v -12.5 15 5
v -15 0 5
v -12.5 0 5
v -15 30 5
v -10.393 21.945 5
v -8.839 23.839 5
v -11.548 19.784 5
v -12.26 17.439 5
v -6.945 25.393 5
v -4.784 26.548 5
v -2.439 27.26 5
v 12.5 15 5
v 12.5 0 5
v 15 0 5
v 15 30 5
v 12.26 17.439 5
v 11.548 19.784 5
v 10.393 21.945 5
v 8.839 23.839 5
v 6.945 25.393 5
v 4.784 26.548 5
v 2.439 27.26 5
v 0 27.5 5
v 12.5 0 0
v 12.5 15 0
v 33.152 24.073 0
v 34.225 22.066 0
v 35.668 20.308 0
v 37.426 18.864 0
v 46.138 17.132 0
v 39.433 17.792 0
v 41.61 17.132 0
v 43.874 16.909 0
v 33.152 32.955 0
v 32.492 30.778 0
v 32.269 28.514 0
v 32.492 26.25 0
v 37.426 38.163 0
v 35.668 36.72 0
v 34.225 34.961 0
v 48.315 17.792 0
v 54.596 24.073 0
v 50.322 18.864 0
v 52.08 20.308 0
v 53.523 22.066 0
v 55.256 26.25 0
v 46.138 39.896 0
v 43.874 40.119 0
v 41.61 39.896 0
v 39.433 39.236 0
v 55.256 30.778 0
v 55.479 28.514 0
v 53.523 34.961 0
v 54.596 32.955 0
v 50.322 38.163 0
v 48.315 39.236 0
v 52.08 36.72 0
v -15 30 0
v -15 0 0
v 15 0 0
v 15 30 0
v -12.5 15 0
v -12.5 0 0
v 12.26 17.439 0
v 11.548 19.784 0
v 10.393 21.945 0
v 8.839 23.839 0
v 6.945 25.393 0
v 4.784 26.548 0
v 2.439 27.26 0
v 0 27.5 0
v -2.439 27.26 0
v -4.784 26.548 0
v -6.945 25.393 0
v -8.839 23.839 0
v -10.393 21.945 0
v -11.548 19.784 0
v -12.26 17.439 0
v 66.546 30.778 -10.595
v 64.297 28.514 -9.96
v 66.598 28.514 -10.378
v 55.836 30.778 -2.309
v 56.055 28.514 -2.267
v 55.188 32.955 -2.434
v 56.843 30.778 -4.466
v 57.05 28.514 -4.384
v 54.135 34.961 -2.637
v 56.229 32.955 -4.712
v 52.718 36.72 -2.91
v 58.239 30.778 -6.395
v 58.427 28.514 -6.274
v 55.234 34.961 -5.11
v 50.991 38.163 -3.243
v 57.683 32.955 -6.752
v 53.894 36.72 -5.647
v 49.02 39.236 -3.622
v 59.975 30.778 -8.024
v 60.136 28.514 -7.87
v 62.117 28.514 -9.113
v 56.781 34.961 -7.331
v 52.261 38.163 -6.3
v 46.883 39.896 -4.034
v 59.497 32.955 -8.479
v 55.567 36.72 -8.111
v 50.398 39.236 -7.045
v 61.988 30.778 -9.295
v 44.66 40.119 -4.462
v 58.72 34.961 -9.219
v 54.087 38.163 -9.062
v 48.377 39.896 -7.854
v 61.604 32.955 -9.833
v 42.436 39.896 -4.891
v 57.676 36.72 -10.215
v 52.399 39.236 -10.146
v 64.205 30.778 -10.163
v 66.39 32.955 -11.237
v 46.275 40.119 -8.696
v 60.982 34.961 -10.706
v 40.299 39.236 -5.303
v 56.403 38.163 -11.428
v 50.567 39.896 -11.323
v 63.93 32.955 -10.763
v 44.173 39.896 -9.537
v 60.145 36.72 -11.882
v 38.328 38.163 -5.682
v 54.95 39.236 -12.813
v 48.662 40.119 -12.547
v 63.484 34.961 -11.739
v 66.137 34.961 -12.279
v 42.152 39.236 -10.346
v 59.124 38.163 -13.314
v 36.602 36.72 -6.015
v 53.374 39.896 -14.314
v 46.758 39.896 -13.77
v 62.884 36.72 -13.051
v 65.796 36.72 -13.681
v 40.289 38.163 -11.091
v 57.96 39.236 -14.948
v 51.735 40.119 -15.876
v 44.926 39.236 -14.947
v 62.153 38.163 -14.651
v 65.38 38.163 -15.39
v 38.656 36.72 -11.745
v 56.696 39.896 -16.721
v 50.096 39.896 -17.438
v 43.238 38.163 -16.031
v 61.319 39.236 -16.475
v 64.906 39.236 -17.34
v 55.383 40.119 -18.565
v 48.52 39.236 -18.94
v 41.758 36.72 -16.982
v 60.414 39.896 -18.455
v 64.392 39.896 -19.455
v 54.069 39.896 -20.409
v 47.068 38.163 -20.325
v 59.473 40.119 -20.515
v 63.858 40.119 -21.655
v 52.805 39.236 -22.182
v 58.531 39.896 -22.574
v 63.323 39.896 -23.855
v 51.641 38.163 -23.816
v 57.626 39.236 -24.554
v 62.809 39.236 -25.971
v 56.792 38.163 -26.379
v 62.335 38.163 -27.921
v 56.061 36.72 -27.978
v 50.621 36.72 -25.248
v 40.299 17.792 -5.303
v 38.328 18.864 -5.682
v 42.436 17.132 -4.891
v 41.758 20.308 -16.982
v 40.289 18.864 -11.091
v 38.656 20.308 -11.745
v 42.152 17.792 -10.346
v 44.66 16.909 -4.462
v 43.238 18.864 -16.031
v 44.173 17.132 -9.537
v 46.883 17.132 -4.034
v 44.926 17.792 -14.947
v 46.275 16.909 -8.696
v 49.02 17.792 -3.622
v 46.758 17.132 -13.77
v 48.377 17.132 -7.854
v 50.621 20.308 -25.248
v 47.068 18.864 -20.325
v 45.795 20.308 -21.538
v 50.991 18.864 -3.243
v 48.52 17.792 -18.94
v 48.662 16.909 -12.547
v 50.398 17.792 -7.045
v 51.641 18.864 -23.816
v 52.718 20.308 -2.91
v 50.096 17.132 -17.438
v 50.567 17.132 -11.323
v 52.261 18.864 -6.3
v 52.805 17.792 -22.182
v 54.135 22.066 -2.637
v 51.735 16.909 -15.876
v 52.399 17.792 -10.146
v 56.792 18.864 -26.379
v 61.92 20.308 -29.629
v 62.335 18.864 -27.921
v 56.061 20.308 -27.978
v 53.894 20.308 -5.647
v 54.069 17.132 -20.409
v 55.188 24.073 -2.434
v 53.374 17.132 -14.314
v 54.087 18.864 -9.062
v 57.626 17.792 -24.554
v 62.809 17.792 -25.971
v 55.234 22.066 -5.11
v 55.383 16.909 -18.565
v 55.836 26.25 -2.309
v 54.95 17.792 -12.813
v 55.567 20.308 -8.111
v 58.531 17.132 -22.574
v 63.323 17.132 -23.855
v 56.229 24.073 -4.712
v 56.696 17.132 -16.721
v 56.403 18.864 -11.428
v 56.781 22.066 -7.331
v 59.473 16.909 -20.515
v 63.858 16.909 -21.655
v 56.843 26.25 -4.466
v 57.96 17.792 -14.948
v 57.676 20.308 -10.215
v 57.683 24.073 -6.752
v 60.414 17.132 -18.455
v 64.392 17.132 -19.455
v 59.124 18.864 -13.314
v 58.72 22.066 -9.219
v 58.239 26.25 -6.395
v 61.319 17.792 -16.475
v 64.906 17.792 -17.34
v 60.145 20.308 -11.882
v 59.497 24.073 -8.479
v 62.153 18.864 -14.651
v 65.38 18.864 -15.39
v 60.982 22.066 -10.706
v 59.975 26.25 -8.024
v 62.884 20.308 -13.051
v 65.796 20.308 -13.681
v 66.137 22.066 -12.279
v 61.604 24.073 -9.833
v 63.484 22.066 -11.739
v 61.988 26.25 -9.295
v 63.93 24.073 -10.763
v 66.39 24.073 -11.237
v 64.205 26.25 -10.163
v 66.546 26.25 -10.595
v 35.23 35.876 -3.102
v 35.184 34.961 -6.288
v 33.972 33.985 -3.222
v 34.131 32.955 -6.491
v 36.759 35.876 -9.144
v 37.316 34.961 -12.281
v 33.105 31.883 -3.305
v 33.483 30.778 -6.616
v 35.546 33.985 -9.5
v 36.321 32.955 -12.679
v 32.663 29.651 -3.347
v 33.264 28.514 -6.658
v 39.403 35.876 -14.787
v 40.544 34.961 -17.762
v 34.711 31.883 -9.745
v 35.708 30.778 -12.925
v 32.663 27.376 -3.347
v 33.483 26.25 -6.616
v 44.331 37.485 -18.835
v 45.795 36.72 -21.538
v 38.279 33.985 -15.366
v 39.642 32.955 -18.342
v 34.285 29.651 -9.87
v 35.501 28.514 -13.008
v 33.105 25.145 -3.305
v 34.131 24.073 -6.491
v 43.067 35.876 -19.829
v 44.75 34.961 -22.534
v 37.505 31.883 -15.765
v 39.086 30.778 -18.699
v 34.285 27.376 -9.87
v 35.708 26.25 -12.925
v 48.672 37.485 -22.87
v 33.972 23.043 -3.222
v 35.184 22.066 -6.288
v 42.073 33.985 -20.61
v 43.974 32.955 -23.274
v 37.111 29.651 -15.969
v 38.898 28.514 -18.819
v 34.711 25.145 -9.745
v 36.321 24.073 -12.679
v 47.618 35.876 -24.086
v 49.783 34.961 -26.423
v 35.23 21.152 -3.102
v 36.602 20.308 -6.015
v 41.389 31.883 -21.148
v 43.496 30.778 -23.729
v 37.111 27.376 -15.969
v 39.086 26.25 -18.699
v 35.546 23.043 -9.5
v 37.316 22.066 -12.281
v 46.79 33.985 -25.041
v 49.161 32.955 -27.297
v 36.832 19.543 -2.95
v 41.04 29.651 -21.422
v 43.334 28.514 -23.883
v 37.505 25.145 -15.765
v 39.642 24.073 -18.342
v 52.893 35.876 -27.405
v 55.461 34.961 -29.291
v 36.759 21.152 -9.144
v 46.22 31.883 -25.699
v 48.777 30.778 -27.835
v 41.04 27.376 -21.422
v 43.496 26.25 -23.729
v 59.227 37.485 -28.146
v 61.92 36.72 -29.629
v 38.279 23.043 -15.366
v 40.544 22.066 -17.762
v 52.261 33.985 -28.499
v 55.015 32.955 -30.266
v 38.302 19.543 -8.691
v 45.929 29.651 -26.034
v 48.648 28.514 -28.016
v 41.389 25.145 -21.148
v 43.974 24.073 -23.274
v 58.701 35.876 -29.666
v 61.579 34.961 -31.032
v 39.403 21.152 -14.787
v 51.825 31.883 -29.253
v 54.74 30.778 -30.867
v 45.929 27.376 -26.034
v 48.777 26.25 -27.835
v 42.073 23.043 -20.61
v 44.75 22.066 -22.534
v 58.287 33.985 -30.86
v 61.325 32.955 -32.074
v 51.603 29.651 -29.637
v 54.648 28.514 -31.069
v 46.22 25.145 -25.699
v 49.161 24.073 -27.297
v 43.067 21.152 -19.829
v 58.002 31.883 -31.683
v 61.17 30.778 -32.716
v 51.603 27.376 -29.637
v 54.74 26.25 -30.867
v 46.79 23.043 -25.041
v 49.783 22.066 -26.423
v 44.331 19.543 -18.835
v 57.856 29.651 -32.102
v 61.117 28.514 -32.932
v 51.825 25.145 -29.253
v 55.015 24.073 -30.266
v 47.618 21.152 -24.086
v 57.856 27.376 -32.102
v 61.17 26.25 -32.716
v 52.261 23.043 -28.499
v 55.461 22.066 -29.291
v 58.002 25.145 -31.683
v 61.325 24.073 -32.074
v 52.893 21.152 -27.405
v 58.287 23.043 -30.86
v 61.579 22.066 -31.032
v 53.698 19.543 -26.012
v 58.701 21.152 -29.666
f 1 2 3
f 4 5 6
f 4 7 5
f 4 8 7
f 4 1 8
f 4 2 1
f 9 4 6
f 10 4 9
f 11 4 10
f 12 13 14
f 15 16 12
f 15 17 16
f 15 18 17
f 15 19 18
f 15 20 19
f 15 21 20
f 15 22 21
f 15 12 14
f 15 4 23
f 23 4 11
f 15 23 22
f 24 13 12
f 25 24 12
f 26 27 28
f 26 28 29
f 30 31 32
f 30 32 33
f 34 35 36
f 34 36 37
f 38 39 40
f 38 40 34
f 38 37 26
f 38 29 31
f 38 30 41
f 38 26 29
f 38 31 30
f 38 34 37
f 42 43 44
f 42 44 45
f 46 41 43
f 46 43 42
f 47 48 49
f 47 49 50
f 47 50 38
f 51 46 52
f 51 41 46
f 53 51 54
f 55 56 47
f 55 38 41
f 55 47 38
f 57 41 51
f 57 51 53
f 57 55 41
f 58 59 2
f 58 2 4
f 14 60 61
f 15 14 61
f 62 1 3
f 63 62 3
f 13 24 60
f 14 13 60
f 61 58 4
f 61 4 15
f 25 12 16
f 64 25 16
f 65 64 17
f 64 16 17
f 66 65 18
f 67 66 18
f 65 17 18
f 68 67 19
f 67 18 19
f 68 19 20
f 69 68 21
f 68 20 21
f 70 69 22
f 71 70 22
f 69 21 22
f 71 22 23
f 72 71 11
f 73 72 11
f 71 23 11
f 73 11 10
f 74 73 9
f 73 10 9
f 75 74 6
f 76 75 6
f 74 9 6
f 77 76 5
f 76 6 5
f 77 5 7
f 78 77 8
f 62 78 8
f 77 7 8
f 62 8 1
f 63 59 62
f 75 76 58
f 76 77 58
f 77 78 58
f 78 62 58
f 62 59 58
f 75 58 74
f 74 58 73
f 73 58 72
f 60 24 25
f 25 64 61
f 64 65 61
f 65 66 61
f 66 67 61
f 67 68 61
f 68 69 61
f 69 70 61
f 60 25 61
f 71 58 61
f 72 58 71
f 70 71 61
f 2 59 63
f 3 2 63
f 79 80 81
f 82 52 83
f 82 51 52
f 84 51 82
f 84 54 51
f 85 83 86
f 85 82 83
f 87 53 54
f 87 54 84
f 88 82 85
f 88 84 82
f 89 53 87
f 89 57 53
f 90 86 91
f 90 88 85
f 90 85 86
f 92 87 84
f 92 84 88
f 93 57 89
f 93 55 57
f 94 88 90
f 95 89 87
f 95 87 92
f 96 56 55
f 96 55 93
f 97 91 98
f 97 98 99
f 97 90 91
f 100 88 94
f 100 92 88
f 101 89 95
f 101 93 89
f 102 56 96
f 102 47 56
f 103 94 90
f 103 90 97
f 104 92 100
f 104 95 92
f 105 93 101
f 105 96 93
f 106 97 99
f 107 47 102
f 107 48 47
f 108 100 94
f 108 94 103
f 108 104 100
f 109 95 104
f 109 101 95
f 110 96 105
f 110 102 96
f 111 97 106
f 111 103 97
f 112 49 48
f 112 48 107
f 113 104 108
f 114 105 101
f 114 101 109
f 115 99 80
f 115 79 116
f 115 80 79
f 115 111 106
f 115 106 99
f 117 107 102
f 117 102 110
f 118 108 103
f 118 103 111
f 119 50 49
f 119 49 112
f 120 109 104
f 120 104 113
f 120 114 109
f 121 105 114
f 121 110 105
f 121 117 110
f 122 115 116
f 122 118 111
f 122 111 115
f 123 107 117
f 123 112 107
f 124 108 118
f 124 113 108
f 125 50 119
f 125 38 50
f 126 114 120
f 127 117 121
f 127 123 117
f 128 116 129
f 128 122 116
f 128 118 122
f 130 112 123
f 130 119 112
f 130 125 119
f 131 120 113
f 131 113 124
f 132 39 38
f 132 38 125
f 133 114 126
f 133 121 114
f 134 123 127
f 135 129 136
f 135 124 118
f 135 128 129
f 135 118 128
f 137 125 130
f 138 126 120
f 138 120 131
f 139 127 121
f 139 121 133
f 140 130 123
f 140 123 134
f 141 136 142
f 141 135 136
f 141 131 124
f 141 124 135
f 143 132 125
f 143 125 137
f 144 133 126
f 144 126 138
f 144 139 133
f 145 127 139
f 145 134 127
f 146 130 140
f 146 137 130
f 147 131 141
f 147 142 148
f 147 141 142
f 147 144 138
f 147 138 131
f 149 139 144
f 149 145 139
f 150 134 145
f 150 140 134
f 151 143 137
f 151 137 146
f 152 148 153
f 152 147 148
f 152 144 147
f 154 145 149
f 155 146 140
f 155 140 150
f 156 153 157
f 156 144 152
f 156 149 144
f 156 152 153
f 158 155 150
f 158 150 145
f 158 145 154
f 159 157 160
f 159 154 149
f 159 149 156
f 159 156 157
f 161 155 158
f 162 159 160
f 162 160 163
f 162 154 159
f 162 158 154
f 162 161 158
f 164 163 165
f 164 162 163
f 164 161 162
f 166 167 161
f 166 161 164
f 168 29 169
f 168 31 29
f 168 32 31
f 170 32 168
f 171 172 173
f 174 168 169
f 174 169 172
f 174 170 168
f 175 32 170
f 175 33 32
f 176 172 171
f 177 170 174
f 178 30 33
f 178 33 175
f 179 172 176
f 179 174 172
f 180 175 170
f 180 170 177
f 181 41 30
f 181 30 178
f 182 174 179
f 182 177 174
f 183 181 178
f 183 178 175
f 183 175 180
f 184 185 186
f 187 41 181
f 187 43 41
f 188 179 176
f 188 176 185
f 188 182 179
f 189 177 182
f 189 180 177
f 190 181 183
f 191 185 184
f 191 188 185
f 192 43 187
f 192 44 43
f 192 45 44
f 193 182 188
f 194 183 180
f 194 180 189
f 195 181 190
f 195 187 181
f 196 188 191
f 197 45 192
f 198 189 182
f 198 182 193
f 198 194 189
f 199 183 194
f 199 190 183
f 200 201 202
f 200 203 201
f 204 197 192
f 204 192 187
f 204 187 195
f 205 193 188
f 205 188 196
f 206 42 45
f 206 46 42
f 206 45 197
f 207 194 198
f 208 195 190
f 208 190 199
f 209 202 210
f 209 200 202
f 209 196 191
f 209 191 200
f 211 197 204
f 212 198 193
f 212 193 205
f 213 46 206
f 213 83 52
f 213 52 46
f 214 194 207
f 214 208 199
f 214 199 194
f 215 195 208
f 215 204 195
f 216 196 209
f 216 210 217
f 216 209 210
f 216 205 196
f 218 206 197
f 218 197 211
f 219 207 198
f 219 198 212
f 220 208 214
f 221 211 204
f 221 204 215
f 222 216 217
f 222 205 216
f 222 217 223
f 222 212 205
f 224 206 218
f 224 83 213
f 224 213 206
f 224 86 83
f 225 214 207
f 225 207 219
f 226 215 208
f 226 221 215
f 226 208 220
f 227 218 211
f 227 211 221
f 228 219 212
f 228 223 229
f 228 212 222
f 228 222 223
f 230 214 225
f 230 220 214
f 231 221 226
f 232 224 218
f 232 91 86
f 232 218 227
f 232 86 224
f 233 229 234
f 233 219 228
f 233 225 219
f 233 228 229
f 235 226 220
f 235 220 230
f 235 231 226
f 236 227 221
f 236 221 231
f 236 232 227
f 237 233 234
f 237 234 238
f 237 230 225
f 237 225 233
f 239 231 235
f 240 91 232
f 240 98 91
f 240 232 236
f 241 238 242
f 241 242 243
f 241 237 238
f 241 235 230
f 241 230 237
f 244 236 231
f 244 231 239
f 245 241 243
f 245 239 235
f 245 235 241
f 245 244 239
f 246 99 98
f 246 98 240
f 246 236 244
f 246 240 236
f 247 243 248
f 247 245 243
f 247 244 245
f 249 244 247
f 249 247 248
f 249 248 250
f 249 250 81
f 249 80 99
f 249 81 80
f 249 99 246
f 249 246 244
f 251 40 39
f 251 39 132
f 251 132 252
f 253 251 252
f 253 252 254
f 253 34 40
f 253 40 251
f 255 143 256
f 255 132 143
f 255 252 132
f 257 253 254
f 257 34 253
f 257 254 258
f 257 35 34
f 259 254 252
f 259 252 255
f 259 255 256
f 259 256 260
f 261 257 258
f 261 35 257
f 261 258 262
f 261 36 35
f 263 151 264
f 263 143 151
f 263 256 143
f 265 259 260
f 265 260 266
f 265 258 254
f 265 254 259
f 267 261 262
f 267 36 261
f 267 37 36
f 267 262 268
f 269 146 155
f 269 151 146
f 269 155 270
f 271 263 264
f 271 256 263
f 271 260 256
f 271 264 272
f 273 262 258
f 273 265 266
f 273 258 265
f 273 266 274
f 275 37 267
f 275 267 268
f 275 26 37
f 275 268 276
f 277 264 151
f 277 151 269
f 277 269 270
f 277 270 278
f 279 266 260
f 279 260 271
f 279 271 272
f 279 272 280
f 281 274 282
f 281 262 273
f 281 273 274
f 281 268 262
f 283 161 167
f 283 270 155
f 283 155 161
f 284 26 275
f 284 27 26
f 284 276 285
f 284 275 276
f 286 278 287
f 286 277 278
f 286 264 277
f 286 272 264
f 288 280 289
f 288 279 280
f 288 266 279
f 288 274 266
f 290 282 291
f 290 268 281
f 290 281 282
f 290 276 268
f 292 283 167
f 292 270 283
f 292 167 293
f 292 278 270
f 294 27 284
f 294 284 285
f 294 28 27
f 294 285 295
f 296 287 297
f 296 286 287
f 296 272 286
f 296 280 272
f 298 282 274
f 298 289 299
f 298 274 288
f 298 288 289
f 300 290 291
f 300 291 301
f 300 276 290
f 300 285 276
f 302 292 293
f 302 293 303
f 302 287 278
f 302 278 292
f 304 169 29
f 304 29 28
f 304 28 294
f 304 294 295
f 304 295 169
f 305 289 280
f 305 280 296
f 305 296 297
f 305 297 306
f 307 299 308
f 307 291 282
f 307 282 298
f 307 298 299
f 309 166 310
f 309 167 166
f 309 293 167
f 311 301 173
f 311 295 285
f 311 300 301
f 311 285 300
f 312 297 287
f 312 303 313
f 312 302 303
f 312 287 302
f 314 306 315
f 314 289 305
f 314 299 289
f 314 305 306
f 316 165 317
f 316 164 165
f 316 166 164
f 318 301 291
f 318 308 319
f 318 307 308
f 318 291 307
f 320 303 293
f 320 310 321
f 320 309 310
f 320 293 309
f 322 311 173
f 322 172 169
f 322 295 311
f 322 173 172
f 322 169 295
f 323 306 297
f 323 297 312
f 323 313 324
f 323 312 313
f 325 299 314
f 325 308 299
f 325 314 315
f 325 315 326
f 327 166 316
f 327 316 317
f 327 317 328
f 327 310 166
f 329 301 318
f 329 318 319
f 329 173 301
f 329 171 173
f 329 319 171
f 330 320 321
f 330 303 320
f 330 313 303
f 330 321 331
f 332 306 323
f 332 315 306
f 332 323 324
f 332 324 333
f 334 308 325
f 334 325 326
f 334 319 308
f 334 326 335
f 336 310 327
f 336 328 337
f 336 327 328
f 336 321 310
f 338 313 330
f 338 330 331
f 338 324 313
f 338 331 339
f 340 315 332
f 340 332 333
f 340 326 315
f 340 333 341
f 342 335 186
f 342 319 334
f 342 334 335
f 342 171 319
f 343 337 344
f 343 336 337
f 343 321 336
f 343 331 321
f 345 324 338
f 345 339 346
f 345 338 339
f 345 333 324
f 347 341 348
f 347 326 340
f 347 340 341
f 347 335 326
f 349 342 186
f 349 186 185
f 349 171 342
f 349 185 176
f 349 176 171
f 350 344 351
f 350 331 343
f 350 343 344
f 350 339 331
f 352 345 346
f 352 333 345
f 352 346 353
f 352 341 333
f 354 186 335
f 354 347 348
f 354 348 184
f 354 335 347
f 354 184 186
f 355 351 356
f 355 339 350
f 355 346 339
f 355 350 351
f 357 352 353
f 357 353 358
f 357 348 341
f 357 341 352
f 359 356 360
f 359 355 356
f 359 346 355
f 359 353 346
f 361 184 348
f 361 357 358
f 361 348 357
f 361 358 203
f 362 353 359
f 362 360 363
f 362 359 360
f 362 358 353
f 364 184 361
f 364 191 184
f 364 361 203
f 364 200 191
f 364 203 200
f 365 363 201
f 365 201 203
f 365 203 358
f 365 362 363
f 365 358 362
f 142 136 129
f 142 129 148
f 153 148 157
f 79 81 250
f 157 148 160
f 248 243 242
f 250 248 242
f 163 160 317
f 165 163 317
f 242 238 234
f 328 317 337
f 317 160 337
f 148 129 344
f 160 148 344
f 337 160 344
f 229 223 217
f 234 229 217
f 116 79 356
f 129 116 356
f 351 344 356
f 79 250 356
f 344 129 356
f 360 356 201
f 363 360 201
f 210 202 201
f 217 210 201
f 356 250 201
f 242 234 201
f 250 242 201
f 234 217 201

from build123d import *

# Parameters (mm, degrees)
F0_W     = 30
F0_H     = 30
F1_DEPTH = 5
F3_DEPTH = 25
F4_R     = 11.605281


with BuildPart() as f1:
    # F0 (on Top) → F1 (new body)
    with BuildSketch(Plane.XY):
        with Locations((0, 15)):
            Rectangle(F0_W, F0_H)
    extrude(amount=F1_DEPTH)

    # F2 (on face) → F3 (cut)
    with BuildSketch(Plane.XY.offset(5)):
        with BuildLine():
            Line((12.5, 0), (12.5, 15))
            ThreePointArc((12.5, 15), (0, 2.5), (-12.5, 15))
            Line((-12.5, 15), (-12.5, 0))
            Line((-12.5, 0), (12.5, 0))
        make_face()
        with BuildLine():
            ThreePointArc((-12.5, 15), (0, 2.5), (12.5, 15))
            ThreePointArc((12.5, 15), (0, 27.5), (-12.5, 15))
        make_face()
    extrude(amount=-F3_DEPTH, mode=Mode.SUBTRACT)


with BuildPart() as f6:
    # F6: sweep along a path in F5
    with BuildLine(Plane.XZ) as f6_path:
        ThreePointArc((43.873992, 0), (50.119589, -14.28472), (63.857641, -21.655379))
    # F4 (on Top) → F6 (sweep)
    with BuildSketch(Plane.XY):
        with Locations((43.873992, 28.513895)):
            Circle(F4_R)
    sweep(path=f6_path.line)


solid = Compound([f1.part, f6.part])
